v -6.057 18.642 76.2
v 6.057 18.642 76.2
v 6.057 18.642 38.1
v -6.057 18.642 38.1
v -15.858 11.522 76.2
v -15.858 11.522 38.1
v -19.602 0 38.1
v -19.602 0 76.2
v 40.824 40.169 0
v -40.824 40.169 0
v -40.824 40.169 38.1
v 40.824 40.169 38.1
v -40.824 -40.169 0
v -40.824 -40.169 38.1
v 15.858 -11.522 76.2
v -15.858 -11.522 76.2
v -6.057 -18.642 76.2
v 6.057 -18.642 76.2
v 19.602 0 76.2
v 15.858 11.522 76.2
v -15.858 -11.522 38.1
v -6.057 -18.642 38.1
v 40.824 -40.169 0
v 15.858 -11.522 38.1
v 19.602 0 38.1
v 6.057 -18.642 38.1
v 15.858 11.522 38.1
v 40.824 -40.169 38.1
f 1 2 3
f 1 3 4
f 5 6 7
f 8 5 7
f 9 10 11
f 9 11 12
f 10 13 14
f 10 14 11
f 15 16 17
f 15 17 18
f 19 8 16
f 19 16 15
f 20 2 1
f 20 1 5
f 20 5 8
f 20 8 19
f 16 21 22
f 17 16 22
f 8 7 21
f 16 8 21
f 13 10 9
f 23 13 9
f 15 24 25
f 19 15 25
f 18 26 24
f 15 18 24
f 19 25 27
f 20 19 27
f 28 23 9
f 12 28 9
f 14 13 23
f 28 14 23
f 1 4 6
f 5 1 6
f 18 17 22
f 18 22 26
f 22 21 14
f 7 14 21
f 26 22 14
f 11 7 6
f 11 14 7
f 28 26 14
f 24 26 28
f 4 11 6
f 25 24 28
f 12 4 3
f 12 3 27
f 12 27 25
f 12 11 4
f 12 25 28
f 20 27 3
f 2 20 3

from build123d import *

# Parameters (mm, degrees)
F0_W     = 81.6473141313
F0_H     = 80.3374648094
F1_DEPTH = 38.1
F3_DEPTH = 76.2


# Not quite as in the source:
# - the program builds the solid bodies; features that only make, move or delete a surface that nothing else refers to are left out


with BuildPart() as f1:
    # F0 (on Top) → F1 (new body)
    with BuildSketch(Plane.XY):
        Rectangle(F0_W, F0_H)
        Polygon((-15.8581690014, 11.5216341958), (-6.0572815592, 18.6423957348), (6.0572815592, 18.6423957348), (15.8581690014, 11.5216341958), (19.6017748844, 0), (15.8581690014, -11.5216341958), (6.0572815592, -18.6423957348), (-6.0572815592, -18.6423957348), (-15.8581690014, -11.5216341958), (-19.6017748844, 0), align=None, mode=Mode.SUBTRACT)
    extrude(amount=F1_DEPTH)

    # F0 (on Top) → F3 (join)
    with BuildSketch(Plane.XY):
        Polygon((6.0572815592, 18.6423957348), (-6.0572815592, 18.6423957348), (-15.8581690014, 11.5216341958), (-19.6017748844, 0), (-15.8581690014, -11.5216341958), (-6.0572815592, -18.6423957348), (6.0572815592, -18.6423957348), (15.8581690014, -11.5216341958), (19.6017748844, 0), (15.8581690014, 11.5216341958), align=None)
    extrude(amount=F3_DEPTH)


solid = f1.part
